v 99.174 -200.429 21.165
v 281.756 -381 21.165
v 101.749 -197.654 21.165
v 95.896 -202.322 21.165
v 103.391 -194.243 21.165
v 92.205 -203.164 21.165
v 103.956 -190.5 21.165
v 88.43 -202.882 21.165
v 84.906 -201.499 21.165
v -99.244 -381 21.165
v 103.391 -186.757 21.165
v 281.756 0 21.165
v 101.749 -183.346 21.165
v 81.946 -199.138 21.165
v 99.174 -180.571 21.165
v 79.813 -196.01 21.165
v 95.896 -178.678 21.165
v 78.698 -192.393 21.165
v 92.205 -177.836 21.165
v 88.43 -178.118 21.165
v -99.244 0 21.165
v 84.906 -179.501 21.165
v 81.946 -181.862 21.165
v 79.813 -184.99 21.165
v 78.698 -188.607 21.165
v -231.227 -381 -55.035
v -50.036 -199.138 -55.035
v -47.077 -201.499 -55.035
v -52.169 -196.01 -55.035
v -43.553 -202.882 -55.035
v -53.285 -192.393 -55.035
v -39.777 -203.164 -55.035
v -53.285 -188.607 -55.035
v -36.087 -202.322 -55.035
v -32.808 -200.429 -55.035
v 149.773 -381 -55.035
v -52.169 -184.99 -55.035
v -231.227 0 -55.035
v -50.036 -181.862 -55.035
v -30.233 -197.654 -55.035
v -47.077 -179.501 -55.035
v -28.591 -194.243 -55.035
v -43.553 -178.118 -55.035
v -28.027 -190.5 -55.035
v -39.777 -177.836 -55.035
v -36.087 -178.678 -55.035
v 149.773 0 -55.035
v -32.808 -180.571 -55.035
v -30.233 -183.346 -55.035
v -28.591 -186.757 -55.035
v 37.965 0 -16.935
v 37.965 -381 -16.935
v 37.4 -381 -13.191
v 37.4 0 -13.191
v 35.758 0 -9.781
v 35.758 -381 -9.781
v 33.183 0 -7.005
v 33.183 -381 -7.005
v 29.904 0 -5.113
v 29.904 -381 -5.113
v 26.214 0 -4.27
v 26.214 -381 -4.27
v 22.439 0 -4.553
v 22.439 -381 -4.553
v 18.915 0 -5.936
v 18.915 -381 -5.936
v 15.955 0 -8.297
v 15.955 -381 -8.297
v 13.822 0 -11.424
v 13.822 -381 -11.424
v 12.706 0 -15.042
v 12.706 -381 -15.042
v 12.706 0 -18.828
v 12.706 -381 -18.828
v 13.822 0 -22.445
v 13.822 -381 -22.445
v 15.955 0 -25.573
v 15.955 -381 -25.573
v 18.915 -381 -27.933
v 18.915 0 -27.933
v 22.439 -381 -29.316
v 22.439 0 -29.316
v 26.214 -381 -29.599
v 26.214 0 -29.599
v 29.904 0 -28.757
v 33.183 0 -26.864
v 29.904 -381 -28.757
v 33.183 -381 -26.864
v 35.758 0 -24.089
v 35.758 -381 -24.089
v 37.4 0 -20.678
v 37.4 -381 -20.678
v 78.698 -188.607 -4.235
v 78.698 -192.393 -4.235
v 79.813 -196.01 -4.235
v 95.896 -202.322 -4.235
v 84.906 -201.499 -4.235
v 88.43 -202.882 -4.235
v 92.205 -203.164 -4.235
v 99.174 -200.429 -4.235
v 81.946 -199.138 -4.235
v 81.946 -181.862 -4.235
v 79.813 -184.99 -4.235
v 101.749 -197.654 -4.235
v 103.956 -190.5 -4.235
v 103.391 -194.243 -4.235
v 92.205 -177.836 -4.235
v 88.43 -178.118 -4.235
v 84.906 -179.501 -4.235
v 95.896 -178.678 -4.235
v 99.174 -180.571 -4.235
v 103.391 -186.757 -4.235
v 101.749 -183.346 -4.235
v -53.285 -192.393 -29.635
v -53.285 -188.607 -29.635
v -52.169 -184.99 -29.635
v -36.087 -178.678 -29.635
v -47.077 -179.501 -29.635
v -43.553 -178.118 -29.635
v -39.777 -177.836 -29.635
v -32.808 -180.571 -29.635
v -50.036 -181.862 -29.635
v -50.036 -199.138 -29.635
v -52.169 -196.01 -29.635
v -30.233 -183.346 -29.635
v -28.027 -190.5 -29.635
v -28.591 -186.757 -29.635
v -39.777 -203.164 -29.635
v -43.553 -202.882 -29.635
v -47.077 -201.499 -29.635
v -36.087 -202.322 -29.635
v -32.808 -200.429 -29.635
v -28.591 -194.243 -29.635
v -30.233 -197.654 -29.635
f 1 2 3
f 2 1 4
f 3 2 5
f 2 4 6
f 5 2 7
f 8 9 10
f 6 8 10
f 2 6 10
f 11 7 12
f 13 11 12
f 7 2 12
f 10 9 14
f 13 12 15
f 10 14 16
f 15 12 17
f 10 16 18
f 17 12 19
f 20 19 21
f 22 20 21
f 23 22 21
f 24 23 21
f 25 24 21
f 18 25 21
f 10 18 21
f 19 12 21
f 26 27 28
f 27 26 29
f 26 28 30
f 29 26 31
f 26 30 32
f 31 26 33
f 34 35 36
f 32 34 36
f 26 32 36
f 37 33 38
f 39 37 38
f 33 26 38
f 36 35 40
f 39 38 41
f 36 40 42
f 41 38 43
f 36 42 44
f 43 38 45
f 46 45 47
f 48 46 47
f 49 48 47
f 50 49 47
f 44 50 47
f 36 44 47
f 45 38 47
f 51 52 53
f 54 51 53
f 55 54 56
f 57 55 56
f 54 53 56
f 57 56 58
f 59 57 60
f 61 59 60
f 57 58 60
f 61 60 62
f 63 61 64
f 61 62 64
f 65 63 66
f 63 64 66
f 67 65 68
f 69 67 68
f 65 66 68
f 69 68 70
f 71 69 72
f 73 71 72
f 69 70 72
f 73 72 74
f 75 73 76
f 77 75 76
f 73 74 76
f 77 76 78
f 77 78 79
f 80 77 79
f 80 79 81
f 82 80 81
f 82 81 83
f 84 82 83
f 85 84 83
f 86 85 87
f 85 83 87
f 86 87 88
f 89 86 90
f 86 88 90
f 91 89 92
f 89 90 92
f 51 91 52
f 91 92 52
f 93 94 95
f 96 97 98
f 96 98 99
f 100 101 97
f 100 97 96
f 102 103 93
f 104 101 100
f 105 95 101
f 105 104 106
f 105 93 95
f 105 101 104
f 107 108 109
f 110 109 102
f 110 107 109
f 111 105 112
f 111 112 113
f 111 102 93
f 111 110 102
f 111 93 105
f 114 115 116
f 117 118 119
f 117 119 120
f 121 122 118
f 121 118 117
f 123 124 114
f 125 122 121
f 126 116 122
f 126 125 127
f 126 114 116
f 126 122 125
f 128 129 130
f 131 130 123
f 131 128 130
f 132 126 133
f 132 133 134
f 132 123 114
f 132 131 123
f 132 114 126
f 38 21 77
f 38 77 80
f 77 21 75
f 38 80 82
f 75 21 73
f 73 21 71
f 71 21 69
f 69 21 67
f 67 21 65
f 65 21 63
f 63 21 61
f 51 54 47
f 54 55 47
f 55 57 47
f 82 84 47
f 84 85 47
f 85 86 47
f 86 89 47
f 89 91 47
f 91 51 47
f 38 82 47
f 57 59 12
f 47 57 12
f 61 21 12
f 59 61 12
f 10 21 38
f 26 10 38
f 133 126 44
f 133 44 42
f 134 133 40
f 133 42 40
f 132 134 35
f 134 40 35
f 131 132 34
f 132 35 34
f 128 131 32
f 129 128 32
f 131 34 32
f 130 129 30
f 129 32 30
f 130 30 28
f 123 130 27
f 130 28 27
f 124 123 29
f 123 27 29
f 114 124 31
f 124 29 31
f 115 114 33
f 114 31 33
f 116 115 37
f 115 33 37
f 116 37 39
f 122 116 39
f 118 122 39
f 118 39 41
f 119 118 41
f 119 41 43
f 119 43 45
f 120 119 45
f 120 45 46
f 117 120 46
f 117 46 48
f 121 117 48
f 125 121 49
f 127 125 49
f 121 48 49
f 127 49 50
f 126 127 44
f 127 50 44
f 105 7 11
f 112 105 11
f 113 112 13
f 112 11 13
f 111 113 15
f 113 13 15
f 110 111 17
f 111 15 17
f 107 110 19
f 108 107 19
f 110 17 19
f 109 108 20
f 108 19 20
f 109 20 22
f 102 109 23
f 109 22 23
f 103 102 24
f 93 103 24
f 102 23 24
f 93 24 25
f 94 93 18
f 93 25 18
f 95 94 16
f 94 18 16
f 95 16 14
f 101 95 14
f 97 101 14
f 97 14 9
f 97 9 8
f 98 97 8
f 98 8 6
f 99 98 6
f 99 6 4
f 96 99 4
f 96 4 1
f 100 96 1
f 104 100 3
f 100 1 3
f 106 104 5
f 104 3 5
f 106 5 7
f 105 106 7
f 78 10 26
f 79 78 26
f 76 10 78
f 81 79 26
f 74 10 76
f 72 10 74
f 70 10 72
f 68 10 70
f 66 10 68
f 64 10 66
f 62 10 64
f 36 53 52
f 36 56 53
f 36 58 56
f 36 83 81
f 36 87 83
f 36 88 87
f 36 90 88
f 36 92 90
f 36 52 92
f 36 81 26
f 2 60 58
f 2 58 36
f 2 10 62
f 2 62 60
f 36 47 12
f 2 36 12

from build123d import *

# Parameters (mm, degrees)
F1_DEPTH = 381
F2_R     = 12.7
F3_DEPTH = 381
F5_R     = 12.7
F6_DEPTH = 25.4
F4_R     = 12.7
F7_DEPTH = 25.4


with BuildPart() as f1:
    # F0 (on Front) → F1 (new body)
    with BuildSketch(Plane.XZ):
        Polygon((-99.244288, 21.165265), (-231.226559, -55.034735), (149.773441, -55.034735), (281.755712, 21.165265), align=None)
    extrude(amount=F1_DEPTH)

    # F2 (on face) → F3 (cut)
    with BuildSketch(Plane.XZ.offset(381)):
        with Locations((25.264577, -16.934735)):
            Circle(F2_R)
    extrude(amount=-F3_DEPTH, mode=Mode.SUBTRACT)

    # F5 (on face) → F6 (cut)
    with BuildSketch(Plane(origin=(0, 0, -55.034735), x_dir=(1, 0, 0), z_dir=(0, 0, -1))):
        with Locations((-40.726559, 190.5)):
            Circle(F5_R)
    extrude(amount=-F6_DEPTH, mode=Mode.SUBTRACT)

    # F4 (on face) → F7 (cut)
    with BuildSketch(Plane.XY.offset(21.165265)):
        with Locations((91.255712, -190.5)):
            Circle(F4_R)
    extrude(amount=-F7_DEPTH, mode=Mode.SUBTRACT)


solid = f1.part
